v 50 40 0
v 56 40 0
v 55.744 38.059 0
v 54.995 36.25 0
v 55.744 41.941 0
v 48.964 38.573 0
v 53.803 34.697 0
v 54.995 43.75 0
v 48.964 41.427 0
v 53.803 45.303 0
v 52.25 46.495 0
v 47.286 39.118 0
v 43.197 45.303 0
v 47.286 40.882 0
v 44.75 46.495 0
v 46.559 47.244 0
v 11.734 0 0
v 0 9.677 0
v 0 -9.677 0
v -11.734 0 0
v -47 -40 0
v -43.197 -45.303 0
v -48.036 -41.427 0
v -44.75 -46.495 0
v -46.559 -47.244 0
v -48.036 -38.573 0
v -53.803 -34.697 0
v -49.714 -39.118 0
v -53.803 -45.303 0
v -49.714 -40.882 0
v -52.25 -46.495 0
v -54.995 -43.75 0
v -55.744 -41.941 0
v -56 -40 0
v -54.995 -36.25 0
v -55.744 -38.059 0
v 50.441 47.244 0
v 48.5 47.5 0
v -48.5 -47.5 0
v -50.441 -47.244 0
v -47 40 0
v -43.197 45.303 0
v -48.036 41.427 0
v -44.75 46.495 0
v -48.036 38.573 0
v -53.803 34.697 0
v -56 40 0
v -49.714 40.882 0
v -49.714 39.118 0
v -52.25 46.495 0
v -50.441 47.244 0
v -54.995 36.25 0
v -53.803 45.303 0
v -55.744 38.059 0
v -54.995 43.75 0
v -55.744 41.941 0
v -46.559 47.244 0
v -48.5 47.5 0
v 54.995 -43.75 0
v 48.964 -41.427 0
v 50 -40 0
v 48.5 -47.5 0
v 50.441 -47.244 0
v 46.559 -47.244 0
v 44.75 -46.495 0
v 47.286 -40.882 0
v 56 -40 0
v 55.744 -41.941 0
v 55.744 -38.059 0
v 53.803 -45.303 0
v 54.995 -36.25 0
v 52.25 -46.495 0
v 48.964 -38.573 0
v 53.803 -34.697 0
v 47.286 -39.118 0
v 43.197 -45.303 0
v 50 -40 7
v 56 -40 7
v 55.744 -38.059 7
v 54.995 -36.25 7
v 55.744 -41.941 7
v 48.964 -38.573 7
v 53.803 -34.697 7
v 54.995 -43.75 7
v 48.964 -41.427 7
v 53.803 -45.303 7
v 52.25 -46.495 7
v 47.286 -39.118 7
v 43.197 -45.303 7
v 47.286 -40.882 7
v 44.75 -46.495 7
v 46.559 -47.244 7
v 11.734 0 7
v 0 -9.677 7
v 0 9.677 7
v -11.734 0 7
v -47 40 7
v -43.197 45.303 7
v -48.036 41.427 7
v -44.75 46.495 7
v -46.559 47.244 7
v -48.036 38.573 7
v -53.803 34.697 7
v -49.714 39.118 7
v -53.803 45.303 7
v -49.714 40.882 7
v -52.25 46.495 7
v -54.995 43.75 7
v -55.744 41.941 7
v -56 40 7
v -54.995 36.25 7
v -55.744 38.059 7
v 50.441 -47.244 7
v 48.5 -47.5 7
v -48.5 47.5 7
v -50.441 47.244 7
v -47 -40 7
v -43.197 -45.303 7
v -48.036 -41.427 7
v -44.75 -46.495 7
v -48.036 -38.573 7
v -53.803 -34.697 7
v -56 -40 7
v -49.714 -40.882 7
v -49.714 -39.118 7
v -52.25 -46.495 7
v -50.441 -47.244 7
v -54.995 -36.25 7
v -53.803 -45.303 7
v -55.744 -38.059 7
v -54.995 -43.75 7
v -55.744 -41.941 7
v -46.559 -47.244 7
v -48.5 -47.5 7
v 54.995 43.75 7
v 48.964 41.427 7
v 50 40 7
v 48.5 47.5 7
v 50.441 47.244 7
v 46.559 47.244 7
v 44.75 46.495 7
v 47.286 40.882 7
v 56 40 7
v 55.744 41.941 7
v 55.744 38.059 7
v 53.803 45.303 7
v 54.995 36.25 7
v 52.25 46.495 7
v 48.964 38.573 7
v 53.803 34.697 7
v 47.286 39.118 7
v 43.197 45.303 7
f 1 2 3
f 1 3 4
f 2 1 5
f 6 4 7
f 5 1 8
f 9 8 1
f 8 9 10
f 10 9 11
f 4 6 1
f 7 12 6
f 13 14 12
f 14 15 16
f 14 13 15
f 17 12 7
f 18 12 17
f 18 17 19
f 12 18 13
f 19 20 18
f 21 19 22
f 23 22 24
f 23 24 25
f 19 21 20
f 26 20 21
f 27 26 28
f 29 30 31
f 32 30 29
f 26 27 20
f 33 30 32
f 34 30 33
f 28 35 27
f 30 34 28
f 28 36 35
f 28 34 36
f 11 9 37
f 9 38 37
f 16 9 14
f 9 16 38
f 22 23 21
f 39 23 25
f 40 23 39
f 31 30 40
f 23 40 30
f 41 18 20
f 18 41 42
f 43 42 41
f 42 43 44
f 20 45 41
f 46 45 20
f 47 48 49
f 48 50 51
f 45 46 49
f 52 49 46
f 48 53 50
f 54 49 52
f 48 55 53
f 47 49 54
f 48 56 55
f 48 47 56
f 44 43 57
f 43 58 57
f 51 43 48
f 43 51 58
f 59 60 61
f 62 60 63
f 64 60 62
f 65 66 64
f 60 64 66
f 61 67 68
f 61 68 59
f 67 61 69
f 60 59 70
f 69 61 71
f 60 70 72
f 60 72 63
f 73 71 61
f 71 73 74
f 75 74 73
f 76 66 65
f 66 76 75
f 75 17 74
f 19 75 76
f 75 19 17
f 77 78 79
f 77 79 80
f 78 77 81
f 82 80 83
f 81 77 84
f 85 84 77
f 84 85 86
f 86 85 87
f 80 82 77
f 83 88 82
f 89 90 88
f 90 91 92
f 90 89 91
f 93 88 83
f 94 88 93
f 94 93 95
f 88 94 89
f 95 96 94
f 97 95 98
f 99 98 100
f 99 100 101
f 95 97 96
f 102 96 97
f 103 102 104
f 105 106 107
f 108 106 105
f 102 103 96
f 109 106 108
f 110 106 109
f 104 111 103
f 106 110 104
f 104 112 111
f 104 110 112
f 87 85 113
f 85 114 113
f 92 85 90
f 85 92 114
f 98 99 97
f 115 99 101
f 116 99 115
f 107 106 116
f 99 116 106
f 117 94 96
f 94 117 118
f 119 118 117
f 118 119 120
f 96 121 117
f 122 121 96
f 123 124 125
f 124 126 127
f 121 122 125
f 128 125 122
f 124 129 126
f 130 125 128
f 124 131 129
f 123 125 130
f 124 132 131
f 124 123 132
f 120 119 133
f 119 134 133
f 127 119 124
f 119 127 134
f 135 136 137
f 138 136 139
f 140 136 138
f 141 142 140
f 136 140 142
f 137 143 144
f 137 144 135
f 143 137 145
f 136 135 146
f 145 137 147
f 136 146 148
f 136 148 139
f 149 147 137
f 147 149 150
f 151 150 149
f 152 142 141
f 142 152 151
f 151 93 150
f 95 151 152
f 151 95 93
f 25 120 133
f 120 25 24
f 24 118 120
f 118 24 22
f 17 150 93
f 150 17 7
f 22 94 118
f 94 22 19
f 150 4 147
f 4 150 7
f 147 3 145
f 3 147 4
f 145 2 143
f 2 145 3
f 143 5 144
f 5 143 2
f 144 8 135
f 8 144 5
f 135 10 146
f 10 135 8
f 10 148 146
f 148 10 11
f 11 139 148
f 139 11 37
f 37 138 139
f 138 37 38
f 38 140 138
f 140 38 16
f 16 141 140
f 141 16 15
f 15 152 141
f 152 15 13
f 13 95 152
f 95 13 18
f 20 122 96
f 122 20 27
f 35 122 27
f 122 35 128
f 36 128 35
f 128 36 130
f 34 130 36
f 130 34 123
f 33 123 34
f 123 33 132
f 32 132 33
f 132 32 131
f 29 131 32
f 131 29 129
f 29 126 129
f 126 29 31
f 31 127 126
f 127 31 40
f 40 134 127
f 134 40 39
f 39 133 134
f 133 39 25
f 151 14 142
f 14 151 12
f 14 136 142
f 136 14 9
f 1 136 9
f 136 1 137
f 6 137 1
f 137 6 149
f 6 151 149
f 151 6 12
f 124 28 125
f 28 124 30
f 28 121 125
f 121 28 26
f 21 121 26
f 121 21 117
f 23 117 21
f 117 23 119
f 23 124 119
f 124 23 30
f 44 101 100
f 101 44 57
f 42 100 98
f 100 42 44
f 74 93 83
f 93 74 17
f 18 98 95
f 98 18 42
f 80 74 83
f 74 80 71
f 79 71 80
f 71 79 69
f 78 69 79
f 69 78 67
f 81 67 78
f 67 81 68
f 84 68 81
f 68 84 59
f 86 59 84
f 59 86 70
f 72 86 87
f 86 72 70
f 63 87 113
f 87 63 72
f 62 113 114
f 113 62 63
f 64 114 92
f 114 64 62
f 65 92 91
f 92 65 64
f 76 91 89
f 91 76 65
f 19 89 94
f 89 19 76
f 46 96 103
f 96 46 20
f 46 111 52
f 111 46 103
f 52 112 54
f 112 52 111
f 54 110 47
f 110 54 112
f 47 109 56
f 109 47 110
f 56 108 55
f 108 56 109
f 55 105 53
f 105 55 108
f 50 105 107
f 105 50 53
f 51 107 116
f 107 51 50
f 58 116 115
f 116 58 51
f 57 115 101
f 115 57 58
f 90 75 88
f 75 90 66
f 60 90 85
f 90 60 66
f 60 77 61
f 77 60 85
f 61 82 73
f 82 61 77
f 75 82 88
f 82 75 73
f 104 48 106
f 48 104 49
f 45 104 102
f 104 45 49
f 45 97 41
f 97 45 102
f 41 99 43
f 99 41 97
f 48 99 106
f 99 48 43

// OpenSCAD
w=97;
h=80;
hole=3;
bar=15;

module singleBar(barHeight=7) {
    linear_extrude(height=barHeight) 
        difference() {
            hull() {
                translate([w/2, h/2, 0]) circle(d=bar, center=true);
                translate([-w/2, -h/2, 0]) circle(d=bar, center=true);
            }
            translate([w/2, h/2, 0]) circle(d=hole, center=true);
            translate([-w/2, -h/2, 0]) circle(d=hole, center=true);
        }
}

union() {
    singleBar(7);
    translate([0,0,7]) rotate([180, 0, 0]) singleBar(7);
}
